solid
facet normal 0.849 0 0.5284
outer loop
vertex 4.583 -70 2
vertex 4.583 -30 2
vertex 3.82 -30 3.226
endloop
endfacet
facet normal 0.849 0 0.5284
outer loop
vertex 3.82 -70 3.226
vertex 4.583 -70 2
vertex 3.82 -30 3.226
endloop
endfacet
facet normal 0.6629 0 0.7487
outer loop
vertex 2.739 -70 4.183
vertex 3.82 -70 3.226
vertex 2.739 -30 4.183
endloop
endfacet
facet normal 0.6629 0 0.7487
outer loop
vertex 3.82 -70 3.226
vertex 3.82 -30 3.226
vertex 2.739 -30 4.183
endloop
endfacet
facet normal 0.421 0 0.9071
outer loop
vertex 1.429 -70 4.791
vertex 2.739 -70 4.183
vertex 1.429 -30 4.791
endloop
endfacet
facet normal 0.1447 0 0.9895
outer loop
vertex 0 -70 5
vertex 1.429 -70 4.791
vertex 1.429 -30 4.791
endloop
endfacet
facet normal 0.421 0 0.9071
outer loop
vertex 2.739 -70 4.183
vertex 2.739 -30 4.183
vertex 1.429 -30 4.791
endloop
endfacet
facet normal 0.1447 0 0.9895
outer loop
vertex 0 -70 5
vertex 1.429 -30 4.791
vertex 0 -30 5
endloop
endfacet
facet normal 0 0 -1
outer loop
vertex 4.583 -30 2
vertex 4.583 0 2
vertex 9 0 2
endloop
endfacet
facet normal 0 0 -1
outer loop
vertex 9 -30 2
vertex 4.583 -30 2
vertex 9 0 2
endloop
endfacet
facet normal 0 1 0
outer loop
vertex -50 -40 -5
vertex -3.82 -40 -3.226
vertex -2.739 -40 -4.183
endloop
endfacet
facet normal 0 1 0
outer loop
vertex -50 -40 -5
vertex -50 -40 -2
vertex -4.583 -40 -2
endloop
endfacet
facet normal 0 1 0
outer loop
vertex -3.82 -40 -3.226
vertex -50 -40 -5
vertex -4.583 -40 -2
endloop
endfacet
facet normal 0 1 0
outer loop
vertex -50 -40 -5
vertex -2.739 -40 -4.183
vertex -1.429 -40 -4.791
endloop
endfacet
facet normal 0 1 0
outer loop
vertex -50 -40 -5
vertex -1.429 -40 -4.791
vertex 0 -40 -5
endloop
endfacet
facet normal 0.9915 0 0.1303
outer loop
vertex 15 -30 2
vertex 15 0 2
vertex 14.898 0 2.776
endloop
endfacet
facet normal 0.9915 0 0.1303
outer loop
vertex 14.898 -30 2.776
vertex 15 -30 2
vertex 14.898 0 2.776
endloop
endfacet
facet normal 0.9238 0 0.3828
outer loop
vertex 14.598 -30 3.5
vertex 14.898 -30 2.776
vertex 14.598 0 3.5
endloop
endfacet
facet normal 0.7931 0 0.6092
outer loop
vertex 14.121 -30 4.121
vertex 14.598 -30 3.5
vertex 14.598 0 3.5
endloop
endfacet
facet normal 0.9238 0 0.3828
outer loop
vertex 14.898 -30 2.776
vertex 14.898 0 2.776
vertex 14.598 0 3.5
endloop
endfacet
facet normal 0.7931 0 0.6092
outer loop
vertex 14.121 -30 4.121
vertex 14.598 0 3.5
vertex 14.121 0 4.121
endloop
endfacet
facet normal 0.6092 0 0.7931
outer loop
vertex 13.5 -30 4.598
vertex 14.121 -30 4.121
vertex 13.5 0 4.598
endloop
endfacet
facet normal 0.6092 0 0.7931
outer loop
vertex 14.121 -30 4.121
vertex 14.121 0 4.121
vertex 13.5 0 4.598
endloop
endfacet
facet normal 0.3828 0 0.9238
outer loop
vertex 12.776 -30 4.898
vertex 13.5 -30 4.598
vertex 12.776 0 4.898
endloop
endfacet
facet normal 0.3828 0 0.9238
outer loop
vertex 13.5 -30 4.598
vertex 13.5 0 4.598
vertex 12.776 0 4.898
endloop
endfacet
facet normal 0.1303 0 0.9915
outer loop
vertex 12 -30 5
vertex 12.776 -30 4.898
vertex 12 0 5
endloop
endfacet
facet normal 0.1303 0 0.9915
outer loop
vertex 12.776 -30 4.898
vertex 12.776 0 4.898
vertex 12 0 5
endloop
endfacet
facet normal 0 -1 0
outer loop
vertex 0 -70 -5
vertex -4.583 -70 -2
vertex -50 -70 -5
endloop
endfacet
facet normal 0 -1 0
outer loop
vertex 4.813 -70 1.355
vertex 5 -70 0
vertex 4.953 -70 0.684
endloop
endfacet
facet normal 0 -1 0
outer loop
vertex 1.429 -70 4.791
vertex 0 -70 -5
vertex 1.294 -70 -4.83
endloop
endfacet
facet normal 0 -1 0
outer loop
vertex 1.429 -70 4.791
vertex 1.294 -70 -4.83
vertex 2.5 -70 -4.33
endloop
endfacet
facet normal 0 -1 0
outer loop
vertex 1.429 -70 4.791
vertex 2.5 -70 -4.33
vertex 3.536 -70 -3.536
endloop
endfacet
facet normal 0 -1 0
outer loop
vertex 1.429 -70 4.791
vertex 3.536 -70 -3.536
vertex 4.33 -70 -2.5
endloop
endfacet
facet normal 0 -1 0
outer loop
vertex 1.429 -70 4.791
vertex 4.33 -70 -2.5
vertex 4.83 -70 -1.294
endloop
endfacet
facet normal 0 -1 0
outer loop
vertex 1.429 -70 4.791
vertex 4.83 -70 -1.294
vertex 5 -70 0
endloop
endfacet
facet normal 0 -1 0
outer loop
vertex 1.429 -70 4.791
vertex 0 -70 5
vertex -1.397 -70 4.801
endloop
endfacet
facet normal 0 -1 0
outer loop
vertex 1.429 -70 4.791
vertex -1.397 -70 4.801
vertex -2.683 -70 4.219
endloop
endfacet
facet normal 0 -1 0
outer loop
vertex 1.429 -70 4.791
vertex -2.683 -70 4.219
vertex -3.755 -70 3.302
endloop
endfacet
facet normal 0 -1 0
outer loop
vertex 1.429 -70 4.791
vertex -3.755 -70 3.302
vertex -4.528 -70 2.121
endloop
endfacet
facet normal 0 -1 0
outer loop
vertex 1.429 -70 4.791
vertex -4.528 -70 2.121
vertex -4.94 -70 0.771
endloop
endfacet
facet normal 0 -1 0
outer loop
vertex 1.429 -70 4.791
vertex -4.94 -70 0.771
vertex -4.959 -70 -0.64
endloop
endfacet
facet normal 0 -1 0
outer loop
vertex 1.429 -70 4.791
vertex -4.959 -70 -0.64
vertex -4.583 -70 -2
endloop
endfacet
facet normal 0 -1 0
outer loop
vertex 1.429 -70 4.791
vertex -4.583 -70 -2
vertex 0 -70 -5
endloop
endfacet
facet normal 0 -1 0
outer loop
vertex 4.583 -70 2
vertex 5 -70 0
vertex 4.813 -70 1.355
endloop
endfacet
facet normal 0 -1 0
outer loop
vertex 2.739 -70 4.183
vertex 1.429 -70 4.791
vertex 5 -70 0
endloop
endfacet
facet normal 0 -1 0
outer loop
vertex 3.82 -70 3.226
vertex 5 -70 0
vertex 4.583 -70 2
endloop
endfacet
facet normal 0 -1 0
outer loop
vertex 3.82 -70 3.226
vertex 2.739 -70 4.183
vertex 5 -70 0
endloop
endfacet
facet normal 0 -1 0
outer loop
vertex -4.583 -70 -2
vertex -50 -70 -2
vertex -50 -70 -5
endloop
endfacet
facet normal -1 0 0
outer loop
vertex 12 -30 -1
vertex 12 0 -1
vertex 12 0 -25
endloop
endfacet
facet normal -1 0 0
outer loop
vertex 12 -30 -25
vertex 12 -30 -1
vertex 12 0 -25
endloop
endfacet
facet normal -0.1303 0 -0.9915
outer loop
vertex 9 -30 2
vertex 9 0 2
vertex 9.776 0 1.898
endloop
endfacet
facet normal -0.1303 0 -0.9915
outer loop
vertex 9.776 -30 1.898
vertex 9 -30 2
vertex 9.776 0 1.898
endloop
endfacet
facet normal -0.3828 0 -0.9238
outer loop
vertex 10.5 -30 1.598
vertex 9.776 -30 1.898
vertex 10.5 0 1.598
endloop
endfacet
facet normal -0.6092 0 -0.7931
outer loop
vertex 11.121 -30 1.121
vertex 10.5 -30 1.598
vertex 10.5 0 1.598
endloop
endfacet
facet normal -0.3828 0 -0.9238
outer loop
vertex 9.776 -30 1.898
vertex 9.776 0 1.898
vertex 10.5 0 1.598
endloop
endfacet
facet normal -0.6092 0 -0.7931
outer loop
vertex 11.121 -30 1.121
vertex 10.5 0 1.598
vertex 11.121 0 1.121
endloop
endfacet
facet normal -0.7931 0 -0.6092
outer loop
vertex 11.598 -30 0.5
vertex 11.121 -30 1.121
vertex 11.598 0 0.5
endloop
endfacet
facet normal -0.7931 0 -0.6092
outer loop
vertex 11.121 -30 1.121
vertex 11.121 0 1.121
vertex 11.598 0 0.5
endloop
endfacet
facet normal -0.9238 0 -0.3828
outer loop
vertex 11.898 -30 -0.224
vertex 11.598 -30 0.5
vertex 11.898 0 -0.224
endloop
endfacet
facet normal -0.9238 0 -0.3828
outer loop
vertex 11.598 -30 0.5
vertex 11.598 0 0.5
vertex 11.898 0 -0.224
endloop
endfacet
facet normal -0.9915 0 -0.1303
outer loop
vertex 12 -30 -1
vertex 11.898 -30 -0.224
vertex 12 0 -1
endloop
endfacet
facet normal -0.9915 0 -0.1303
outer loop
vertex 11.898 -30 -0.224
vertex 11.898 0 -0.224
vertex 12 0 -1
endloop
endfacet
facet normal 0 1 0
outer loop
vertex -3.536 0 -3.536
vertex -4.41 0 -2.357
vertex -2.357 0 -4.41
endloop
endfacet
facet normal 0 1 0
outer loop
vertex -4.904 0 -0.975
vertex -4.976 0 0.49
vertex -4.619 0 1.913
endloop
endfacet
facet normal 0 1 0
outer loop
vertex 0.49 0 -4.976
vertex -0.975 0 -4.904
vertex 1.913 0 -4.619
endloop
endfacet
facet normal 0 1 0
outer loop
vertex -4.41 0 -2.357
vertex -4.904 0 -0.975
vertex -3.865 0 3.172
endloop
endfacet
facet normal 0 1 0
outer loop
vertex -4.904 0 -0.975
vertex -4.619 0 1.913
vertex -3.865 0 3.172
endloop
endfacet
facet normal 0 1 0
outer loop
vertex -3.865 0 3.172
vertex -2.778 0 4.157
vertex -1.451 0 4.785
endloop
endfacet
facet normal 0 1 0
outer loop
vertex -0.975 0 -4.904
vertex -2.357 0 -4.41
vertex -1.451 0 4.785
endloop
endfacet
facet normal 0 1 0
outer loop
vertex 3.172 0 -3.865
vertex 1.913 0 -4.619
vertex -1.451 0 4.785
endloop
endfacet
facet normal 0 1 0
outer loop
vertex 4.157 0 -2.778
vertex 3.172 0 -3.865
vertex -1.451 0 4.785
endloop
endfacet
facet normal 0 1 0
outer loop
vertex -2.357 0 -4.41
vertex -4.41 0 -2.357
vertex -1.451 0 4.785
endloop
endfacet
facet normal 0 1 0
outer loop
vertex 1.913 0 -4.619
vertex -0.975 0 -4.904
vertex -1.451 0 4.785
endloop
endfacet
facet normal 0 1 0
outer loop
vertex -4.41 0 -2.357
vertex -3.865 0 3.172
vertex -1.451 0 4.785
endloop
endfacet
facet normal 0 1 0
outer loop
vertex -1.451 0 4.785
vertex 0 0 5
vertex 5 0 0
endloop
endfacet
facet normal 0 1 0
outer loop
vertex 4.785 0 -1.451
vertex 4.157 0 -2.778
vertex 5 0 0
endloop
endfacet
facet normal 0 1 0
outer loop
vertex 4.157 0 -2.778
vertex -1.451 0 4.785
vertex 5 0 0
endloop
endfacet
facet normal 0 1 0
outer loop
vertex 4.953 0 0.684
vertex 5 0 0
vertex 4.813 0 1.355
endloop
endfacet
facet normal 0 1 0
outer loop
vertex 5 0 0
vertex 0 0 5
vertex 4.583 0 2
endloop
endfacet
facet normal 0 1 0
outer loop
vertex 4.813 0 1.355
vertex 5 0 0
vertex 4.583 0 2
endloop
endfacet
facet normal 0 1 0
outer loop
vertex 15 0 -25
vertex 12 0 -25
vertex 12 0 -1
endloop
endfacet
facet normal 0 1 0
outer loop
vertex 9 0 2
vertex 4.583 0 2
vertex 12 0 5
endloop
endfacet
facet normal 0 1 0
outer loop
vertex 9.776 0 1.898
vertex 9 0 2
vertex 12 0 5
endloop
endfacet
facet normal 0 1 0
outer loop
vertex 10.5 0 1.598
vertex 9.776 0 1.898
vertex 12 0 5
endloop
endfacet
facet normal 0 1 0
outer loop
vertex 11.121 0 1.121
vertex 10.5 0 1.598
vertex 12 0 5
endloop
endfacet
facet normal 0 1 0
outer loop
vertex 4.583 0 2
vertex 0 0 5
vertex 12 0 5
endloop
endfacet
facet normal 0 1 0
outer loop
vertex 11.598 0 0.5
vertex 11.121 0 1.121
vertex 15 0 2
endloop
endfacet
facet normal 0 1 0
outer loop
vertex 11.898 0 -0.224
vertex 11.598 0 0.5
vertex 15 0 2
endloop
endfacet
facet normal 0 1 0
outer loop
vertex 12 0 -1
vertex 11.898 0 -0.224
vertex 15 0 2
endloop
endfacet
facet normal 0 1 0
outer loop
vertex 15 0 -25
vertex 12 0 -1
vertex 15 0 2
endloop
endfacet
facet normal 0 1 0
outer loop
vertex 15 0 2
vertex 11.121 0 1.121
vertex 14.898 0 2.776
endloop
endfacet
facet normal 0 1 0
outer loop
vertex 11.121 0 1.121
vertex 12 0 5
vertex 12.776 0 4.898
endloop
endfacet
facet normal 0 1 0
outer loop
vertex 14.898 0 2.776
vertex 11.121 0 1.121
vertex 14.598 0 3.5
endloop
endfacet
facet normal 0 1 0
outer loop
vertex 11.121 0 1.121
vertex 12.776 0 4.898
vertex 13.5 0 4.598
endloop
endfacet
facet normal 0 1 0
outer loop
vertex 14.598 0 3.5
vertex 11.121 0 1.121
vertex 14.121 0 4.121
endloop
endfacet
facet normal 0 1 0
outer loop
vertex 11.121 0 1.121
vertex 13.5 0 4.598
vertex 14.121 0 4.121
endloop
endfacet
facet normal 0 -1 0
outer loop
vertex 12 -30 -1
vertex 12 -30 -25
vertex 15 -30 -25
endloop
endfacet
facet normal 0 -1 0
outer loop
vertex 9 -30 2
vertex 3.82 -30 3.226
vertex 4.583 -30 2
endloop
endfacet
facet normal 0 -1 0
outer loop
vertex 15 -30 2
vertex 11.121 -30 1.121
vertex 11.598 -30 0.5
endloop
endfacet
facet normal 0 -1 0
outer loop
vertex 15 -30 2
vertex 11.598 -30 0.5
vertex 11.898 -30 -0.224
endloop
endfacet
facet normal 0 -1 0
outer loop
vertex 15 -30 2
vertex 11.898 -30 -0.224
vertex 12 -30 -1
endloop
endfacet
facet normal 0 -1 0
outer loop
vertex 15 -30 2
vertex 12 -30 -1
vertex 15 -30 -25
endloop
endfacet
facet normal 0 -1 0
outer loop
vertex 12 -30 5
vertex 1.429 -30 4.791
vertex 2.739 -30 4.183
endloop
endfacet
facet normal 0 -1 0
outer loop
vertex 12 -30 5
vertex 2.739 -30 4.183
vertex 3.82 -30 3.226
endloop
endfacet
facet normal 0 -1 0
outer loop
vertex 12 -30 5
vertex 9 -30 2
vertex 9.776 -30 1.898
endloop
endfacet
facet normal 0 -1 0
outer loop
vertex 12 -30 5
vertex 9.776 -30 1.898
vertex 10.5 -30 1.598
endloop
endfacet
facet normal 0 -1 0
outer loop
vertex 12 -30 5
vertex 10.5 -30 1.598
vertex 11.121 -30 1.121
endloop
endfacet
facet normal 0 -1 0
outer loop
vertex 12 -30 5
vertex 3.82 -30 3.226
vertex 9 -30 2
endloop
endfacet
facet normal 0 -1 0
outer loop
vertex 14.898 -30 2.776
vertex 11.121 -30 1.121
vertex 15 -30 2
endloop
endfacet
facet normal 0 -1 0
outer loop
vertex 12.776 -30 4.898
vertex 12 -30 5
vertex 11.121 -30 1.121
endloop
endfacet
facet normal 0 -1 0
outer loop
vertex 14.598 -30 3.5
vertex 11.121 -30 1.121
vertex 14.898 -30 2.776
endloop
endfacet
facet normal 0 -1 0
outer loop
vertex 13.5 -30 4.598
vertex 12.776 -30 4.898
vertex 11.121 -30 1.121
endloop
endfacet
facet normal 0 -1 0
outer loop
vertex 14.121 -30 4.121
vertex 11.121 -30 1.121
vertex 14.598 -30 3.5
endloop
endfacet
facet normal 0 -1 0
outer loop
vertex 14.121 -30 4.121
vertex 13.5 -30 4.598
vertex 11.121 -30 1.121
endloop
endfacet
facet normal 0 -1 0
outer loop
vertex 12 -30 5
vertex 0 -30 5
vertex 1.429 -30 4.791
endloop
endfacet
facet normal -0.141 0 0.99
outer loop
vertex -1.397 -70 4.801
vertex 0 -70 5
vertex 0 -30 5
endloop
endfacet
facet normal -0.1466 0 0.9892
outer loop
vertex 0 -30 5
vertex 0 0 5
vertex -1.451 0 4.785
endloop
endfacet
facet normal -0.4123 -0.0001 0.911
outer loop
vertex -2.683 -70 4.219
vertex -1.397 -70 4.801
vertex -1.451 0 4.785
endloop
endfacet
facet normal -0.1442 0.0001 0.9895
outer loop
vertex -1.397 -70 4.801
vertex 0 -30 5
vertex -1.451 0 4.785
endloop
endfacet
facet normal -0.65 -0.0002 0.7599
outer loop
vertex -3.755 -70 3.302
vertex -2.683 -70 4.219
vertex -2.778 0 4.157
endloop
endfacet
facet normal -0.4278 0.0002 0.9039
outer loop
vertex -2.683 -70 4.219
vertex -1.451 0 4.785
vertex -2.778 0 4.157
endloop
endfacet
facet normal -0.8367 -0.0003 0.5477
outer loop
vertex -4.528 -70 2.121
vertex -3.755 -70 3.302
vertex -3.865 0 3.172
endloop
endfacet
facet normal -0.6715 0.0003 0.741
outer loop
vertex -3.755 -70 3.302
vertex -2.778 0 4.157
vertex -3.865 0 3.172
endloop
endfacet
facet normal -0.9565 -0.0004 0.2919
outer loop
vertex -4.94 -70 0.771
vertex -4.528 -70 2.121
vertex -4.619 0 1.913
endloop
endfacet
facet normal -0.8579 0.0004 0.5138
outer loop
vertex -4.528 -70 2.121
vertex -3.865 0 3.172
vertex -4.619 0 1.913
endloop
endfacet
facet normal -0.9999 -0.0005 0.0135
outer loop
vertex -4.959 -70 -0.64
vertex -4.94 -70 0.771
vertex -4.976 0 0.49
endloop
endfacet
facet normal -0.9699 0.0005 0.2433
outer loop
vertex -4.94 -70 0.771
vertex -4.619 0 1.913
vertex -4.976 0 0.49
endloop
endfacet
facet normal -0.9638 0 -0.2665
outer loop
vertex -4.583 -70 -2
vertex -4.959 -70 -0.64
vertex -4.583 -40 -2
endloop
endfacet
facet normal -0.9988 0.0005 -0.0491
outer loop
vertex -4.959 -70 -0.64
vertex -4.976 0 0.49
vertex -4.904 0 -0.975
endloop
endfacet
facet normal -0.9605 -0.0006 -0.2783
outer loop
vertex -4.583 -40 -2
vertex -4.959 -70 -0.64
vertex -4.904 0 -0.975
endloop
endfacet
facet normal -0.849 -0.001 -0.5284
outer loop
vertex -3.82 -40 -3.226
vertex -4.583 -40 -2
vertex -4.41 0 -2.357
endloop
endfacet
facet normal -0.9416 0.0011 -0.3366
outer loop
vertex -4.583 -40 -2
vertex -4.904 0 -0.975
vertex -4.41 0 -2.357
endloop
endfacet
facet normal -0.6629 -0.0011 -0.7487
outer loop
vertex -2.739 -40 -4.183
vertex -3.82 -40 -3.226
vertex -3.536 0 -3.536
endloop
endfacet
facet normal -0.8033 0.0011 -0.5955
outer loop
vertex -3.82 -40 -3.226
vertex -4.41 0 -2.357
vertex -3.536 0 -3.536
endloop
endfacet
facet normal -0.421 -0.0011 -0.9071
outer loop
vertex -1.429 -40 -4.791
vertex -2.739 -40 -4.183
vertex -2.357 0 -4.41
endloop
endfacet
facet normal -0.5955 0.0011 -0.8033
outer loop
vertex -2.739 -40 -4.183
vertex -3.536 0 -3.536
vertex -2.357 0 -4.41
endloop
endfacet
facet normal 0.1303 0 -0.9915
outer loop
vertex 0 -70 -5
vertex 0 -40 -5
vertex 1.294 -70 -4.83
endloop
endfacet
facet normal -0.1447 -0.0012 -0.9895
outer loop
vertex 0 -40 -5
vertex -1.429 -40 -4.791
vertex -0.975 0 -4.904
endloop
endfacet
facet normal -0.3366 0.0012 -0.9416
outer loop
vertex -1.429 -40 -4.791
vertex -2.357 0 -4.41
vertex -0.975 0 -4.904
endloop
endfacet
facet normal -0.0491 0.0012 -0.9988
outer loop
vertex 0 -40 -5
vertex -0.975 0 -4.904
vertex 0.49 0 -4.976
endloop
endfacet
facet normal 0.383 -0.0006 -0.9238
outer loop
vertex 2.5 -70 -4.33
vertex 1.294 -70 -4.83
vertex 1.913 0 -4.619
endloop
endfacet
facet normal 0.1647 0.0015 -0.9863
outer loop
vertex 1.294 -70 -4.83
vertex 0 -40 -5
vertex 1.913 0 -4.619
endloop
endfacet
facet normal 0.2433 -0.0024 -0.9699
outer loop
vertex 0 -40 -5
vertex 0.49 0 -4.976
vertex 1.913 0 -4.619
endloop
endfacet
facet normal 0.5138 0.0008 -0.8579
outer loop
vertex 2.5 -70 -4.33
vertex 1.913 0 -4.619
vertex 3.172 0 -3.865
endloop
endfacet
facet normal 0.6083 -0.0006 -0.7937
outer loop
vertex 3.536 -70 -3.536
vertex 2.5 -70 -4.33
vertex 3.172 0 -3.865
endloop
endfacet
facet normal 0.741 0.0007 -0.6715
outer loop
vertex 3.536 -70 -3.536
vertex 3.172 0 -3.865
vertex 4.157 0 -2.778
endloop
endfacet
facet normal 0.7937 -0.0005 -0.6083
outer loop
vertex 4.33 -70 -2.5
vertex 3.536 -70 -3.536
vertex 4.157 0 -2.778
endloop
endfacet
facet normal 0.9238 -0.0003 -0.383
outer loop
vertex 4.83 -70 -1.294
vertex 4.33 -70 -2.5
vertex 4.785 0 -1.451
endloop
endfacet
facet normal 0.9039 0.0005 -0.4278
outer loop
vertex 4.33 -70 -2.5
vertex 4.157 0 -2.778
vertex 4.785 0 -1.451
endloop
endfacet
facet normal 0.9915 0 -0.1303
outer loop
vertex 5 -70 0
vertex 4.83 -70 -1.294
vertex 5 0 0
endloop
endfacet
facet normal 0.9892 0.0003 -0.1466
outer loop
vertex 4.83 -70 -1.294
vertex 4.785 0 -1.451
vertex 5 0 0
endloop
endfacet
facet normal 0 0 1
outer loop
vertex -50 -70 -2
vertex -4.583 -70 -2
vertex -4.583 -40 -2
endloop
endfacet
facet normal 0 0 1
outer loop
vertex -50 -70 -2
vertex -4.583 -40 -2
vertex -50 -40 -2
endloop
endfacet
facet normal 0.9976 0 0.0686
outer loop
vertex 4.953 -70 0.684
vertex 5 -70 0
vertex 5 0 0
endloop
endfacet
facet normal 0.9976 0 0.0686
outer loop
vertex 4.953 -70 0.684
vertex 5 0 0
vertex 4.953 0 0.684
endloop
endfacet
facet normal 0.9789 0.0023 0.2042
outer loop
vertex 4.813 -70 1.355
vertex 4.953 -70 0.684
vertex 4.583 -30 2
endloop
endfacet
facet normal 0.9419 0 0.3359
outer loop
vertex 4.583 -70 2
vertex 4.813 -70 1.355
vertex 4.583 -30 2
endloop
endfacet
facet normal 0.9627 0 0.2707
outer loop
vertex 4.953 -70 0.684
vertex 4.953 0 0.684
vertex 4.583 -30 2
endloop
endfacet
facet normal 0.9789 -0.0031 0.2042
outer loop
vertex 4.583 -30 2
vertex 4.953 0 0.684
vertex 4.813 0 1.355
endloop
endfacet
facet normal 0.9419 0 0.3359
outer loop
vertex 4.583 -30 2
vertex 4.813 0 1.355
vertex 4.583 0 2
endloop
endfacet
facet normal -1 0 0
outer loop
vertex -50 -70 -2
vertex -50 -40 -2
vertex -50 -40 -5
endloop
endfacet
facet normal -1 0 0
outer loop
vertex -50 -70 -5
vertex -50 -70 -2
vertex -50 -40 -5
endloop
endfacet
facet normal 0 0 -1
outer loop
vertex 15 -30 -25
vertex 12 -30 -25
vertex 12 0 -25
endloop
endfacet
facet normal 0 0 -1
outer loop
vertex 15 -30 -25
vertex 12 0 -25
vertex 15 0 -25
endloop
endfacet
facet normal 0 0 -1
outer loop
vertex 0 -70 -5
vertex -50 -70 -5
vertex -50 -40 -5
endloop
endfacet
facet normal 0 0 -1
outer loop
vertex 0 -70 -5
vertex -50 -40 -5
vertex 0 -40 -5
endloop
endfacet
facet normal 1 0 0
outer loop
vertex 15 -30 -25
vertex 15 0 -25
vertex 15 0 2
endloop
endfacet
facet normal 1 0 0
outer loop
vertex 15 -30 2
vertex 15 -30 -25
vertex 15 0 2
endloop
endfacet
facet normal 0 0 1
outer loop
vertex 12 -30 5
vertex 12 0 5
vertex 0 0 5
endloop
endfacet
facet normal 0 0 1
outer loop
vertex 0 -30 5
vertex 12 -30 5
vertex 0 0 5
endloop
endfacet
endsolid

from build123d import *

# Parameters (mm, degrees)
F1_DEPTH = 70
F2_DEPTH = 30
F4_DEPTH = 30


with BuildPart() as f1:
    # F0 (on Front) → F1 (new body)
    with BuildSketch(Plane.XZ):
        with BuildLine():
            Line((0, 2), (0, 5))
            ThreePointArc((0, 5), (-3.535534, -3.535534), (5, 0))
            ThreePointArc((5, 0), (4.894532, 1.021548), (4.582576, 2))
            Line((4.582576, 2), (0, 2))
        make_face()
        with BuildLine():
            ThreePointArc((4.582576, 2), (2.738613, 4.1833), (0, 5))
            Line((0, 5), (0, 2))
            Line((0, 2), (4.582576, 2))
        make_face()
    extrude(amount=F1_DEPTH)

    # F0 (on Front) → F2 (join)
    with BuildSketch(Plane.XZ):
        with BuildLine():
            Line((12, 5), (0, 5))
            ThreePointArc((0, 5), (2.738613, 4.1833), (4.582576, 2))
            Line((4.582576, 2), (9, 2))
            ThreePointArc((9, 2), (11.12132, 1.12132), (12, -1))
            Line((12, -1), (12, -25))
            Line((12, -25), (15, -25))
            Line((15, -25), (15, -3))
            Line((15, -3), (15, 2))
            ThreePointArc((15, 2), (14.12132, 4.12132), (12, 5))
        make_face()
    extrude(amount=F2_DEPTH)

    # F3 (on face) → F4 (join)
    with BuildSketch(Plane.XZ.offset(70)):
        with BuildLine():
            ThreePointArc((0, -5), (-2.738613, -4.1833), (-4.582576, -2))
            Line((-4.582576, -2), (-50, -2))
            Line((-50, -2), (-50, -5))
            Line((-50, -5), (0, -5))
        make_face()
    extrude(amount=-F4_DEPTH)


solid = f1.part
